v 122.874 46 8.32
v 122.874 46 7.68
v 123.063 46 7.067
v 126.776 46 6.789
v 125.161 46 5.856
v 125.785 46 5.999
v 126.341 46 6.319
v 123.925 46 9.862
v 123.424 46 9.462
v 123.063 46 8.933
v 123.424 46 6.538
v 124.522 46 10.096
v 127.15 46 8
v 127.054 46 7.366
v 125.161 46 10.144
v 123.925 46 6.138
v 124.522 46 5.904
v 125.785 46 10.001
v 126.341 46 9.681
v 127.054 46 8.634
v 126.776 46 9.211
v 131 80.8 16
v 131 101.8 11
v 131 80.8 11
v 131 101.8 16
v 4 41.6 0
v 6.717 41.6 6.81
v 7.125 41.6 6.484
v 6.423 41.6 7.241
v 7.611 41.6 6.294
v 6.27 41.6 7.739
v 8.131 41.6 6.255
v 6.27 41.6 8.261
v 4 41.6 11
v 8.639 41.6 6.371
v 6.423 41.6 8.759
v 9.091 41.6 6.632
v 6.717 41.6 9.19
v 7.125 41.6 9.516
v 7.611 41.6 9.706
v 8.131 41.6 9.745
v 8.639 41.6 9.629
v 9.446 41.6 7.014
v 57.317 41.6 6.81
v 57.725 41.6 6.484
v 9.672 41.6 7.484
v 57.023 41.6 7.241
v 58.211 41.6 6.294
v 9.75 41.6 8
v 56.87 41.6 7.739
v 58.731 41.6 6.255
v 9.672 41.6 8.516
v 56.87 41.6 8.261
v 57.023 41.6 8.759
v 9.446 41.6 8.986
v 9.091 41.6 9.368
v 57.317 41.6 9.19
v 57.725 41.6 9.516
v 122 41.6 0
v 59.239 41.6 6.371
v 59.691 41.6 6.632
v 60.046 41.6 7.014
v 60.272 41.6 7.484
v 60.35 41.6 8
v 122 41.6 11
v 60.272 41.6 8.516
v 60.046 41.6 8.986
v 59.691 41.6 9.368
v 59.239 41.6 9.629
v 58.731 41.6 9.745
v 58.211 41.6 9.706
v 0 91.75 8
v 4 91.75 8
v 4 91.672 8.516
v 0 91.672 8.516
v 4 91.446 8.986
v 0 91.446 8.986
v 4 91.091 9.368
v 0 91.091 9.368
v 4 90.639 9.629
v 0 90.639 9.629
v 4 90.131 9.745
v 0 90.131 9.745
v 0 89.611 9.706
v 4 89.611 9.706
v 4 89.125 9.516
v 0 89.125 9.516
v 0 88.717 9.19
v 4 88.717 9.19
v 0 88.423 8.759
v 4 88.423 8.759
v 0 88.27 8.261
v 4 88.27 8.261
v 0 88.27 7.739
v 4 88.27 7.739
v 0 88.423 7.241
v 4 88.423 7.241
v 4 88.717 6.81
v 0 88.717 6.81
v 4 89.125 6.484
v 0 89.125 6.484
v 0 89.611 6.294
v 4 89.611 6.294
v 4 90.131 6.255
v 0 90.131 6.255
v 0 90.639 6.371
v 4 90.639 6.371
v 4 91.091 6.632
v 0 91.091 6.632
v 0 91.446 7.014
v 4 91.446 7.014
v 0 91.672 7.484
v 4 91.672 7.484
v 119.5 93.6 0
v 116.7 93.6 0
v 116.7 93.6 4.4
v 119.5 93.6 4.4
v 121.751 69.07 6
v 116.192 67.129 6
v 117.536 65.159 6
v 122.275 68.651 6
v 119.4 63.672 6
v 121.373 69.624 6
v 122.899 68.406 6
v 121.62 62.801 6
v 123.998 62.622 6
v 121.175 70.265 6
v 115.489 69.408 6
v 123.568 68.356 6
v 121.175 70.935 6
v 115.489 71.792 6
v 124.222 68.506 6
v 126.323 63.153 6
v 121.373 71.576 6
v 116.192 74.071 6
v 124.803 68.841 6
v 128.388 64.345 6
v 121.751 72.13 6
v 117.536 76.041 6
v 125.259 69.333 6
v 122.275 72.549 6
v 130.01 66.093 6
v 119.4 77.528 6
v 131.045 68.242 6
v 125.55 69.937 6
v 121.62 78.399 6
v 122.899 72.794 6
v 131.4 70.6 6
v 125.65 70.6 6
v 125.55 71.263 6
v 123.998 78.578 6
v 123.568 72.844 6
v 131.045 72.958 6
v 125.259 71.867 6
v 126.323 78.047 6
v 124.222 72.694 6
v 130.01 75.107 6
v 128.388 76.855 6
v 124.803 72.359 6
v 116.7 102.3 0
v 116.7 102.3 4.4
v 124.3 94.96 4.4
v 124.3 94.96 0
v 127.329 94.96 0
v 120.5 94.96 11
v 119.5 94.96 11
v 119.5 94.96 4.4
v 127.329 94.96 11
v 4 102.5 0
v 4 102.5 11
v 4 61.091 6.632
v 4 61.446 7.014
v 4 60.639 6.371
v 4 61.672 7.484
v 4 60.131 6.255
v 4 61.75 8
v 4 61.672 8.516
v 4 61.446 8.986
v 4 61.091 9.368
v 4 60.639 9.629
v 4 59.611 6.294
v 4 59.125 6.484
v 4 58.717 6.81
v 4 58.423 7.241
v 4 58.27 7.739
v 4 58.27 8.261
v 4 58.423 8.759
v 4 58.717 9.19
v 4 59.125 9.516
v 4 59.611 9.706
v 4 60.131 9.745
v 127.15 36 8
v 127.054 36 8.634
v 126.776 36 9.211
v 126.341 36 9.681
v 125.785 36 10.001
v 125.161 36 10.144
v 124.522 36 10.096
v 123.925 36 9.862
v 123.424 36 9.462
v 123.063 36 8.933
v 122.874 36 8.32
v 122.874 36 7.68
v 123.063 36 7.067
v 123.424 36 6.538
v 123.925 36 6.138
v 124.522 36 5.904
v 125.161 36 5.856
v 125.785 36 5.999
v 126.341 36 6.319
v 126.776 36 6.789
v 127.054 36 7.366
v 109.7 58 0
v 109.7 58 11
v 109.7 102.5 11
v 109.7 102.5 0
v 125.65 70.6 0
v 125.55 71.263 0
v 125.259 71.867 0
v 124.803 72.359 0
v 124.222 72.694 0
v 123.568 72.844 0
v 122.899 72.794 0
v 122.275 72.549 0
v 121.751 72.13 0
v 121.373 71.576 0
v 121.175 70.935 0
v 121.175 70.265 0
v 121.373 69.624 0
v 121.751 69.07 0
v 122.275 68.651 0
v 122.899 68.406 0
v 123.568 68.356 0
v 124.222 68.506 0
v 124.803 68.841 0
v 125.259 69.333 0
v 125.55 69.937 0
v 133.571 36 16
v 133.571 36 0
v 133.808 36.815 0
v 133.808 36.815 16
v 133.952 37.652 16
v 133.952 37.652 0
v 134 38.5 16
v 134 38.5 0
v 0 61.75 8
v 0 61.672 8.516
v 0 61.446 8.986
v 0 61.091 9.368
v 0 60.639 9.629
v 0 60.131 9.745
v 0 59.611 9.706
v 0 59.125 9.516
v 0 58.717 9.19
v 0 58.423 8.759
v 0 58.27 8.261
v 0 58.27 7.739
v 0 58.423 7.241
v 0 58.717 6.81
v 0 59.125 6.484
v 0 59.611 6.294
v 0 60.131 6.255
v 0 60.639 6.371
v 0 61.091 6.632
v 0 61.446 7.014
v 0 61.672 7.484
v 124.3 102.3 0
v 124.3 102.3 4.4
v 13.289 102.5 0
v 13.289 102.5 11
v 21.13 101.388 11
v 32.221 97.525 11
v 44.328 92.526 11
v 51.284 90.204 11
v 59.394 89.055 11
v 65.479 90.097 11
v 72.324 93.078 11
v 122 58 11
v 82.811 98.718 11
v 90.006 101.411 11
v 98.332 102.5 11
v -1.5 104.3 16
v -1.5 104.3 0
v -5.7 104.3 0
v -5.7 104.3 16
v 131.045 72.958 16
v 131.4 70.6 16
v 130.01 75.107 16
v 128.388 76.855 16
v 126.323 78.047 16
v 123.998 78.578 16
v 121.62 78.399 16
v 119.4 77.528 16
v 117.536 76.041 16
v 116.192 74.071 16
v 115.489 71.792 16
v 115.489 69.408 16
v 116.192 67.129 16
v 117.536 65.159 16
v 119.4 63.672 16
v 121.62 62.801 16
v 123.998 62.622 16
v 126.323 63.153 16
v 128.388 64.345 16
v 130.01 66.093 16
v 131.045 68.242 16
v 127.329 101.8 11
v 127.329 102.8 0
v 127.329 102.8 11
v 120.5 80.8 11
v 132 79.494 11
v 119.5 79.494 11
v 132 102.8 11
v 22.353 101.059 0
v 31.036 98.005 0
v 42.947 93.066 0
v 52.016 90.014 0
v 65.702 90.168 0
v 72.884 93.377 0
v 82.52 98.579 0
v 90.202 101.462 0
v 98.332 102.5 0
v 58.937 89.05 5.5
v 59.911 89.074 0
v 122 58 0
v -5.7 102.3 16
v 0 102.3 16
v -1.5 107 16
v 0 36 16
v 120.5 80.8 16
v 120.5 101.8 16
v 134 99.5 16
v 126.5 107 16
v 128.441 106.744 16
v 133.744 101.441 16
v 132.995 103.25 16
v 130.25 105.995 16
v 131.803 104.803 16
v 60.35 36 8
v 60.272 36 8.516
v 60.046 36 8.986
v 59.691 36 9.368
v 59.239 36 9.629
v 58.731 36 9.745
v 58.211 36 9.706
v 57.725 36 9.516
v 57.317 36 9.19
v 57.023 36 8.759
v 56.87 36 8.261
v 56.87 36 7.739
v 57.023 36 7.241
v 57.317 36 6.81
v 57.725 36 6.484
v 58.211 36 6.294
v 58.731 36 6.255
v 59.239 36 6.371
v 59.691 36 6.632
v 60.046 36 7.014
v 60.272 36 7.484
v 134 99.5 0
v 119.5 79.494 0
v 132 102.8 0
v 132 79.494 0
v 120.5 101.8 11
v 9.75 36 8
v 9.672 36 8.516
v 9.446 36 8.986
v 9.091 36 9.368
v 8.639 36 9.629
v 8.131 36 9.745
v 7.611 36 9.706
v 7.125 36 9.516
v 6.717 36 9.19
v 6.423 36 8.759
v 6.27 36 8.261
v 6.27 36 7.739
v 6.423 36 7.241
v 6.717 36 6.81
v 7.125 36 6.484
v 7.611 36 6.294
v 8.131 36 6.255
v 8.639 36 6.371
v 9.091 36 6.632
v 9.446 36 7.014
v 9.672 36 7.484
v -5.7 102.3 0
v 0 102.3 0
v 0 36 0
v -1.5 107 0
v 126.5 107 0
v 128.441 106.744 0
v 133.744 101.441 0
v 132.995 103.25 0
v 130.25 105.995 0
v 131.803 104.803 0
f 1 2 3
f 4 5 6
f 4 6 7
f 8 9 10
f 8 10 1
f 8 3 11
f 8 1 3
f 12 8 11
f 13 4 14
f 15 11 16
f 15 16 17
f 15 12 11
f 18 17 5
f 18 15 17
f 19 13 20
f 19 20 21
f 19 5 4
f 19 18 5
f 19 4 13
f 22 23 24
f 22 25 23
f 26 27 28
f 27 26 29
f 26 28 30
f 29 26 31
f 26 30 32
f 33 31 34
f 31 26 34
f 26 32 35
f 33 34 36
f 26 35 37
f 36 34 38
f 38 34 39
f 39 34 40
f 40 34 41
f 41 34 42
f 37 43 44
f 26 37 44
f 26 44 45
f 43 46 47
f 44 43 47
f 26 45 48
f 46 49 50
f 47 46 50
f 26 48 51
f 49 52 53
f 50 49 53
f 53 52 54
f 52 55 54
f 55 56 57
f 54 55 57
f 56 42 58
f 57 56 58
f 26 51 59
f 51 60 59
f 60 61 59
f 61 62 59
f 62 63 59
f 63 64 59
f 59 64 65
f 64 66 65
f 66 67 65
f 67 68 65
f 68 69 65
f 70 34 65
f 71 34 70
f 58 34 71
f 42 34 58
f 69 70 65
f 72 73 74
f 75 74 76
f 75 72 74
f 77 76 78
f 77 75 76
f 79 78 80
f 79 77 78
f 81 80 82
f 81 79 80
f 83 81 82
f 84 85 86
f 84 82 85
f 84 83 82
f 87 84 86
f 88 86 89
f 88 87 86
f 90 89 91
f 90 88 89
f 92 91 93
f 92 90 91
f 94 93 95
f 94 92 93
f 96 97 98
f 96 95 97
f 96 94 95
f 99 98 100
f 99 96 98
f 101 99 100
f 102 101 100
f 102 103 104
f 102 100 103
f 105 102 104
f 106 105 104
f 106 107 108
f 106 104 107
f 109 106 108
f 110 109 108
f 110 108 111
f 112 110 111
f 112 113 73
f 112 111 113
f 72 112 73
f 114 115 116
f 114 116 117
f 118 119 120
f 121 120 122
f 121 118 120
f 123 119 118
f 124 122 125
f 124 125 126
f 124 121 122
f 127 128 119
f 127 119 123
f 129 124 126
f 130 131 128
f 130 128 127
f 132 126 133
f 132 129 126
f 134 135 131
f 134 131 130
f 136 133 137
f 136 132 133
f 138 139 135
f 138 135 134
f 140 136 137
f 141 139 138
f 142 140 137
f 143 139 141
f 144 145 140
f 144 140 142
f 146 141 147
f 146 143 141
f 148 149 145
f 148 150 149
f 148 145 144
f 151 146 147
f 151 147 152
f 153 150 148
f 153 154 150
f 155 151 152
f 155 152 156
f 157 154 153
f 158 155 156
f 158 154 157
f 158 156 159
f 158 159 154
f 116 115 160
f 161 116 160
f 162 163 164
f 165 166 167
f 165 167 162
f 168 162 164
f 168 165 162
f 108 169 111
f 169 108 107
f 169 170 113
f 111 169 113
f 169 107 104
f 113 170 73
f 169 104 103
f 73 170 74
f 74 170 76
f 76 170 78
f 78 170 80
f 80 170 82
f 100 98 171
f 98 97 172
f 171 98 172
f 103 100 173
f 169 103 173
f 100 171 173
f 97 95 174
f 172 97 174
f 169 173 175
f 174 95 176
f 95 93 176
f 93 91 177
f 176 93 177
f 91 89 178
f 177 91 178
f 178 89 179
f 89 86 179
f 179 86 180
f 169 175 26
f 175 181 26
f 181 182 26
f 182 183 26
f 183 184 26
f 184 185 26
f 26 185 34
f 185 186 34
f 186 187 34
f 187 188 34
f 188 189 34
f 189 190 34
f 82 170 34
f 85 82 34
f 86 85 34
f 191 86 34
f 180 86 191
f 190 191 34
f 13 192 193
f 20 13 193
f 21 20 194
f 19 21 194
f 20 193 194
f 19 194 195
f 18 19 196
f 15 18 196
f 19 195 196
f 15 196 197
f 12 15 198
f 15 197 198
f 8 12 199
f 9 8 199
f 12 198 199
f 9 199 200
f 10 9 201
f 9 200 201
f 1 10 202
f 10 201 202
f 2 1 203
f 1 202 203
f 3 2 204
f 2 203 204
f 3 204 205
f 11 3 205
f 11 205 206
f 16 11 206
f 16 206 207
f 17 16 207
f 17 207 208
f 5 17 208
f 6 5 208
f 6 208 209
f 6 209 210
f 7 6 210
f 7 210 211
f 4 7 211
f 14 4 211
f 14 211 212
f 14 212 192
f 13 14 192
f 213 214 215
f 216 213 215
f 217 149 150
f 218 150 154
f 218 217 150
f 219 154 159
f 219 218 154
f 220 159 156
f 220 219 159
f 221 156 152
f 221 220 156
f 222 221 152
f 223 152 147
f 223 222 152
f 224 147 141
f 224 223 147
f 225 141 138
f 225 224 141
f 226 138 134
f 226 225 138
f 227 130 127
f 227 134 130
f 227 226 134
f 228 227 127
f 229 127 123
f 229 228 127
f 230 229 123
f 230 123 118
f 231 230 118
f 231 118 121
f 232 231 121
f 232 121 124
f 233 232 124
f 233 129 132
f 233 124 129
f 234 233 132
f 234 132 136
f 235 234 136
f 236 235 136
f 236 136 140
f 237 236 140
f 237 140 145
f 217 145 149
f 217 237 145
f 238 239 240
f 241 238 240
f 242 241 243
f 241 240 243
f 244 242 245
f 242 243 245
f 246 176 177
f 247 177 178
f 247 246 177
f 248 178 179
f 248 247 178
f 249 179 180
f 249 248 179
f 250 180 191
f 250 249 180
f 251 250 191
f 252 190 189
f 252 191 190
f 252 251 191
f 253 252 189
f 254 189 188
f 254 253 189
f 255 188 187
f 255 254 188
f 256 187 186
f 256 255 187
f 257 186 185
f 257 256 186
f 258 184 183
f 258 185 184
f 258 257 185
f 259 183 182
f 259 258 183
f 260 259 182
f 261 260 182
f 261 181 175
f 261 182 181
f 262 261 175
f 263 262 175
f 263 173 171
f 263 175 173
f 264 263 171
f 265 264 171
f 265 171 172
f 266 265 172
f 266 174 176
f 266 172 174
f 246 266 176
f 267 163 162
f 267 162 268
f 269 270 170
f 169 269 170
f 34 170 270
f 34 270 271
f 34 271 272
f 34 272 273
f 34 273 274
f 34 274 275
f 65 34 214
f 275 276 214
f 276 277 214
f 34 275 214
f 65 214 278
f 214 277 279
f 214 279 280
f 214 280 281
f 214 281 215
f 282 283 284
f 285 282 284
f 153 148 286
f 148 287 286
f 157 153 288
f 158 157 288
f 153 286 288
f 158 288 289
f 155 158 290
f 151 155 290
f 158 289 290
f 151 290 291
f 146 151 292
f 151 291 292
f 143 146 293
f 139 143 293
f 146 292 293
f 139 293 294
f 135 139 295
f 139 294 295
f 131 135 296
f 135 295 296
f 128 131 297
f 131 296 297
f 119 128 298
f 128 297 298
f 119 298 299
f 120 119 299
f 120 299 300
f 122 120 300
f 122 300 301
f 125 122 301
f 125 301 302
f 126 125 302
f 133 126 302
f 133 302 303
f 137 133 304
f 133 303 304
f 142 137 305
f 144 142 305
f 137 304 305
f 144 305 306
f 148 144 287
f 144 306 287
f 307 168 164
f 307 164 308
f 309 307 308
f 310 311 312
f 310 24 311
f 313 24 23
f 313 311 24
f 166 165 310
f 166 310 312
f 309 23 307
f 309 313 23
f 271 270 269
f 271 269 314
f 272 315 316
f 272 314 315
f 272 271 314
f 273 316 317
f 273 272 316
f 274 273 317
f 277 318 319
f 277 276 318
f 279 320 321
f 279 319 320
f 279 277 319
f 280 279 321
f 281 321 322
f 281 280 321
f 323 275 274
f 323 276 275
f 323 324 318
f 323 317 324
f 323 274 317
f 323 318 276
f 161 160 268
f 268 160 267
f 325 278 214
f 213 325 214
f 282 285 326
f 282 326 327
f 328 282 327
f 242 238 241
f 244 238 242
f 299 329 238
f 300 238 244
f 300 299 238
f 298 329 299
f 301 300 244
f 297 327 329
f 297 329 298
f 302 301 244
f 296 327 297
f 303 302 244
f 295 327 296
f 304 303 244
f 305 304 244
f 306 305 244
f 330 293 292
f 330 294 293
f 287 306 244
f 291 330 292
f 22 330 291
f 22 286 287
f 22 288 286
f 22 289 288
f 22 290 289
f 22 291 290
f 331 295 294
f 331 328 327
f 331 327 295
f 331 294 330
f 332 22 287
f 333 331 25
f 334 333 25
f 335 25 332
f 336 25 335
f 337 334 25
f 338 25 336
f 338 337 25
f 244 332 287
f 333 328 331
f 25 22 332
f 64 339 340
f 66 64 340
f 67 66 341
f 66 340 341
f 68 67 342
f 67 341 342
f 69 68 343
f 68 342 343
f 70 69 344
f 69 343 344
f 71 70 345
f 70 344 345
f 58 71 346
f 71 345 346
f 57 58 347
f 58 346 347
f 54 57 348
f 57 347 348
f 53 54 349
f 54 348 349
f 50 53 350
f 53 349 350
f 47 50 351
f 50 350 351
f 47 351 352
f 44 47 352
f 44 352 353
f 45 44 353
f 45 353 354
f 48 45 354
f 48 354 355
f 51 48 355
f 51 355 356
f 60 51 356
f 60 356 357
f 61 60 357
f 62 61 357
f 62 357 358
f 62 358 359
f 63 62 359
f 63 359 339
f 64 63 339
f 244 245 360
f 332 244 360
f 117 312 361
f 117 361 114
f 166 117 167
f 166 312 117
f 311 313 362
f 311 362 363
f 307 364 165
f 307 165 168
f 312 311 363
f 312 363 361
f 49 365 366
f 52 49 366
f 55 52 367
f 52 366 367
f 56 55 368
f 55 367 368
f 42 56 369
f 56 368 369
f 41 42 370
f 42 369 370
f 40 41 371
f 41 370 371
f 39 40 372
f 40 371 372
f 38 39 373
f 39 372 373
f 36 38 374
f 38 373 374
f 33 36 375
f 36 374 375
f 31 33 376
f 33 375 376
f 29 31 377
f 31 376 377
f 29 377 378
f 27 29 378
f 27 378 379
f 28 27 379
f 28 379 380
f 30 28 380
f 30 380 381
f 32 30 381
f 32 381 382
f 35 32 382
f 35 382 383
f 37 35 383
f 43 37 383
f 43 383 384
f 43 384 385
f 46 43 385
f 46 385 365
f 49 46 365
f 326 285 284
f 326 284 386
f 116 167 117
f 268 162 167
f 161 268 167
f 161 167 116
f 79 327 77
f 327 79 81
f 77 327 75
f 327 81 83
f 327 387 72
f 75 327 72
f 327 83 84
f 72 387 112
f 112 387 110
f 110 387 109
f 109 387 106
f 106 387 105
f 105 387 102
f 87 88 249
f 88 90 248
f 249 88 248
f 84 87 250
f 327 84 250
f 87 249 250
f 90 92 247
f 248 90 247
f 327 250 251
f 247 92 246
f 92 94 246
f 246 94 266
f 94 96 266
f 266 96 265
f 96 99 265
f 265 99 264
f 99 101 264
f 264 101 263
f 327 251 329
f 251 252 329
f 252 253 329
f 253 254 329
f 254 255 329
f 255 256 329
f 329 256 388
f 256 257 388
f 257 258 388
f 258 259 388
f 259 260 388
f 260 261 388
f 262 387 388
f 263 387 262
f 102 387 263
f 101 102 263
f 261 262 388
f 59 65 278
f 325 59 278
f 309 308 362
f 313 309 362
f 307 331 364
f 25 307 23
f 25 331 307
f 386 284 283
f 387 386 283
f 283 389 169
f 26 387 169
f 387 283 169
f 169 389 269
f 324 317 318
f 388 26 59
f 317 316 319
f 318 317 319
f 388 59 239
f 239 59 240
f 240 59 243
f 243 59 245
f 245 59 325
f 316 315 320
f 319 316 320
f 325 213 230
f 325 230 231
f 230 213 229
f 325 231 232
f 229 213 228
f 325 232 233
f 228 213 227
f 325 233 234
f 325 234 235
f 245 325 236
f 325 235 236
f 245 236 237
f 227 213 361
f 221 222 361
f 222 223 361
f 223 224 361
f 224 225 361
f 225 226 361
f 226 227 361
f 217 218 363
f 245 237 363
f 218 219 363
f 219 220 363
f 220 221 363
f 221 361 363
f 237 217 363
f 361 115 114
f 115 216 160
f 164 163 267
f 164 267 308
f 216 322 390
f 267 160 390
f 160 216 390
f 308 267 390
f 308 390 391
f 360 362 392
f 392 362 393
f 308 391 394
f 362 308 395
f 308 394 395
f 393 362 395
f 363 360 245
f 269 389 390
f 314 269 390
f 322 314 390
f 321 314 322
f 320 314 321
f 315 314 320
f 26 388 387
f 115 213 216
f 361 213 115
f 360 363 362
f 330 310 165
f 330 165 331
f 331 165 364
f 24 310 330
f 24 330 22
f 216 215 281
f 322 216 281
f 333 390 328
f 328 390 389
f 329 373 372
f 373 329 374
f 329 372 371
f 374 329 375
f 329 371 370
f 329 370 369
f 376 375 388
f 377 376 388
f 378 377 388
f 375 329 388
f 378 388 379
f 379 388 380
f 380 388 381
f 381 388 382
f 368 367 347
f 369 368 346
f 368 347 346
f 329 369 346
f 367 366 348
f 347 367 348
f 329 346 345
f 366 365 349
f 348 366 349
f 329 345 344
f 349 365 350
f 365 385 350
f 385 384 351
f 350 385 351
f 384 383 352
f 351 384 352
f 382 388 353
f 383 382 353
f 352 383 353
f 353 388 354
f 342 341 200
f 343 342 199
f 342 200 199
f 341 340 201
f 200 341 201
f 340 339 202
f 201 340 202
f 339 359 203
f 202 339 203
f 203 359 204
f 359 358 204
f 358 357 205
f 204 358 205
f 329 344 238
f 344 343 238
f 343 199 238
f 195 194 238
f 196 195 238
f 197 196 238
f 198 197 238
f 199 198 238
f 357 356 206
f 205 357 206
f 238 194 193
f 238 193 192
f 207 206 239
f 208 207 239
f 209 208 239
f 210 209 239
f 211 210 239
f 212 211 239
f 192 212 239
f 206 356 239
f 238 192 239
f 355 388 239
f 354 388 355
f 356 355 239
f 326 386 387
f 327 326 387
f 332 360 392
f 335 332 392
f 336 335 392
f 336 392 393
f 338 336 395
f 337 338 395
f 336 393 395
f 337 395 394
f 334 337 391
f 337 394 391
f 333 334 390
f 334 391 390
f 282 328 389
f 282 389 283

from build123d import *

# Parameters (mm, degrees)
SKETCH_R        = 2.25
PAD_DEPTH       = 16
POCKET_DEPTH    = 21
SKETCH002_R     = 1.75
POCKET001_DEPTH = 23
SKETCH003_R     = 1.75
SKETCH003_R_2   = 2.15
POCKET002_DEPTH = 46
SKETCH005_R     = 8
POCKET004_DEPTH = 5
POCKET005_DEPTH = 4.4
SKETCH007_W     = 10.5
SKETCH007_H     = 21
POCKET006_DEPTH = 5
POCKET007_DEPTH = 18


with BuildPart() as part:
    # Sketch → Pad (new body)
    with BuildSketch(Plane.XY):
        with BuildLine():
            Line((0, 36), (75.6, 36))
            Line((75.6, 36), (133.571068, 36))
            ThreePointArc((133.571068, 36), (133.891989, 37.231735), (134, 38.5))
            Line((134, 38.5), (134, 99.5))
            ThreePointArc((134, 99.5), (131.803301, 104.803301), (126.5, 107))
            Line((126.5, 107), (-1.5, 107))
            Line((-1.5, 107), (-1.5, 104.3))
            Line((-1.5, 104.3), (-5.7, 104.3))
            Line((-5.7, 104.3), (-5.7, 102.3))
            Line((-5.7, 102.3), (0, 102.3))
            Line((0, 102.3), (0, 36))
        make_face()
        with Locations((123.4, 70.6)):
            Circle(SKETCH_R, mode=Mode.SUBTRACT)
    extrude(amount=PAD_DEPTH)

    # Sketch001 (on DatumPlane) → Pocket (cut)
    with BuildSketch(Plane.XY.offset(11)):
        with BuildLine():
            Line((13.289069, 102.5), (4, 102.5))
            Line((4, 102.5), (4, 41.6))
            Line((4, 41.6), (80, 41.6))
            Line((80, 41.6), (122, 41.6))
            Line((122, 41.6), (122, 58))
            Line((122, 58), (109.7, 58))
            Line((109.7, 58), (109.7, 102.5))
            Line((109.7, 102.5), (98.331885, 102.5))
            add(Edge.make_bspline(
                [(13.289069, 102.5), (27.487875, 102.5), (63.575842, 75.600151), (81.110251, 102.5), (98.331885, 102.5)],
                knots=[0, 0, 0, 0, 0.5, 1, 1, 1, 1], degree=3))
        make_face()
        Polygon((128.6, 101.8), (131, 101.8), (131, 79.9), (120.7, 79.9), (120.7, 93.6), (120.7, 93.9), (124.3, 93.9), (128.6, 93.9), align=None)
    extrude(amount=-POCKET_DEPTH, mode=Mode.SUBTRACT)

    # Sketch002 → Pocket001 (cut)
    with BuildSketch(Plane.YZ):
        with Locations((12, 8)):
            Circle(SKETCH002_R)
        with Locations((60, 8)):
            Circle(SKETCH002_R)
        with Locations((90, 8)):
            Circle(SKETCH002_R)
    extrude(amount=POCKET001_DEPTH, mode=Mode.SUBTRACT)

    # Sketch003 → Pocket002 (cut)
    with BuildSketch(Plane.XZ):
        with Locations((58.6, 8)):
            Circle(SKETCH003_R)
        with Locations((8, 8)):
            Circle(SKETCH003_R)
        with Locations((125, 8)):
            Circle(SKETCH003_R_2)
    extrude(amount=-POCKET002_DEPTH, mode=Mode.SUBTRACT)

    # Sketch005 (on DatumPlane) → Pocket004 (cut, symmetric)
    with BuildSketch(Plane.XY.offset(11)):
        with Locations((123.4, 70.6)):
            Circle(SKETCH005_R)
    extrude(amount=POCKET004_DEPTH, both=True, mode=Mode.SUBTRACT)

    # Sketch006 → Pocket005 (cut)
    with BuildSketch(Plane.XY):
        Polygon((116.7, 102.3), (124.3, 102.3), (124.3, 93.9), (124.3, 93.6), (120.7, 93.6), (116.7, 93.6), align=None)
    extrude(amount=POCKET005_DEPTH, mode=Mode.SUBTRACT)

    # Sketch007 (on DatumPlane) → Pocket006 (cut)
    with BuildSketch(Plane.XY.offset(11)):
        with Locations((125.75, 91.3)):
            Rectangle(SKETCH007_W, SKETCH007_H)
    extrude(amount=POCKET006_DEPTH, mode=Mode.SUBTRACT)

    # Sketch008 (on DatumPlane) → Pocket007 (cut)
    with BuildSketch(Plane.XY.offset(11)):
        Polygon((127.328613, 102.8), (132, 102.8), (132, 79.494476), (119.5, 79.494476), (119.5, 94.960373), (127.328613, 94.960373), align=None)
    extrude(amount=-POCKET007_DEPTH, mode=Mode.SUBTRACT)


solid = part.part
